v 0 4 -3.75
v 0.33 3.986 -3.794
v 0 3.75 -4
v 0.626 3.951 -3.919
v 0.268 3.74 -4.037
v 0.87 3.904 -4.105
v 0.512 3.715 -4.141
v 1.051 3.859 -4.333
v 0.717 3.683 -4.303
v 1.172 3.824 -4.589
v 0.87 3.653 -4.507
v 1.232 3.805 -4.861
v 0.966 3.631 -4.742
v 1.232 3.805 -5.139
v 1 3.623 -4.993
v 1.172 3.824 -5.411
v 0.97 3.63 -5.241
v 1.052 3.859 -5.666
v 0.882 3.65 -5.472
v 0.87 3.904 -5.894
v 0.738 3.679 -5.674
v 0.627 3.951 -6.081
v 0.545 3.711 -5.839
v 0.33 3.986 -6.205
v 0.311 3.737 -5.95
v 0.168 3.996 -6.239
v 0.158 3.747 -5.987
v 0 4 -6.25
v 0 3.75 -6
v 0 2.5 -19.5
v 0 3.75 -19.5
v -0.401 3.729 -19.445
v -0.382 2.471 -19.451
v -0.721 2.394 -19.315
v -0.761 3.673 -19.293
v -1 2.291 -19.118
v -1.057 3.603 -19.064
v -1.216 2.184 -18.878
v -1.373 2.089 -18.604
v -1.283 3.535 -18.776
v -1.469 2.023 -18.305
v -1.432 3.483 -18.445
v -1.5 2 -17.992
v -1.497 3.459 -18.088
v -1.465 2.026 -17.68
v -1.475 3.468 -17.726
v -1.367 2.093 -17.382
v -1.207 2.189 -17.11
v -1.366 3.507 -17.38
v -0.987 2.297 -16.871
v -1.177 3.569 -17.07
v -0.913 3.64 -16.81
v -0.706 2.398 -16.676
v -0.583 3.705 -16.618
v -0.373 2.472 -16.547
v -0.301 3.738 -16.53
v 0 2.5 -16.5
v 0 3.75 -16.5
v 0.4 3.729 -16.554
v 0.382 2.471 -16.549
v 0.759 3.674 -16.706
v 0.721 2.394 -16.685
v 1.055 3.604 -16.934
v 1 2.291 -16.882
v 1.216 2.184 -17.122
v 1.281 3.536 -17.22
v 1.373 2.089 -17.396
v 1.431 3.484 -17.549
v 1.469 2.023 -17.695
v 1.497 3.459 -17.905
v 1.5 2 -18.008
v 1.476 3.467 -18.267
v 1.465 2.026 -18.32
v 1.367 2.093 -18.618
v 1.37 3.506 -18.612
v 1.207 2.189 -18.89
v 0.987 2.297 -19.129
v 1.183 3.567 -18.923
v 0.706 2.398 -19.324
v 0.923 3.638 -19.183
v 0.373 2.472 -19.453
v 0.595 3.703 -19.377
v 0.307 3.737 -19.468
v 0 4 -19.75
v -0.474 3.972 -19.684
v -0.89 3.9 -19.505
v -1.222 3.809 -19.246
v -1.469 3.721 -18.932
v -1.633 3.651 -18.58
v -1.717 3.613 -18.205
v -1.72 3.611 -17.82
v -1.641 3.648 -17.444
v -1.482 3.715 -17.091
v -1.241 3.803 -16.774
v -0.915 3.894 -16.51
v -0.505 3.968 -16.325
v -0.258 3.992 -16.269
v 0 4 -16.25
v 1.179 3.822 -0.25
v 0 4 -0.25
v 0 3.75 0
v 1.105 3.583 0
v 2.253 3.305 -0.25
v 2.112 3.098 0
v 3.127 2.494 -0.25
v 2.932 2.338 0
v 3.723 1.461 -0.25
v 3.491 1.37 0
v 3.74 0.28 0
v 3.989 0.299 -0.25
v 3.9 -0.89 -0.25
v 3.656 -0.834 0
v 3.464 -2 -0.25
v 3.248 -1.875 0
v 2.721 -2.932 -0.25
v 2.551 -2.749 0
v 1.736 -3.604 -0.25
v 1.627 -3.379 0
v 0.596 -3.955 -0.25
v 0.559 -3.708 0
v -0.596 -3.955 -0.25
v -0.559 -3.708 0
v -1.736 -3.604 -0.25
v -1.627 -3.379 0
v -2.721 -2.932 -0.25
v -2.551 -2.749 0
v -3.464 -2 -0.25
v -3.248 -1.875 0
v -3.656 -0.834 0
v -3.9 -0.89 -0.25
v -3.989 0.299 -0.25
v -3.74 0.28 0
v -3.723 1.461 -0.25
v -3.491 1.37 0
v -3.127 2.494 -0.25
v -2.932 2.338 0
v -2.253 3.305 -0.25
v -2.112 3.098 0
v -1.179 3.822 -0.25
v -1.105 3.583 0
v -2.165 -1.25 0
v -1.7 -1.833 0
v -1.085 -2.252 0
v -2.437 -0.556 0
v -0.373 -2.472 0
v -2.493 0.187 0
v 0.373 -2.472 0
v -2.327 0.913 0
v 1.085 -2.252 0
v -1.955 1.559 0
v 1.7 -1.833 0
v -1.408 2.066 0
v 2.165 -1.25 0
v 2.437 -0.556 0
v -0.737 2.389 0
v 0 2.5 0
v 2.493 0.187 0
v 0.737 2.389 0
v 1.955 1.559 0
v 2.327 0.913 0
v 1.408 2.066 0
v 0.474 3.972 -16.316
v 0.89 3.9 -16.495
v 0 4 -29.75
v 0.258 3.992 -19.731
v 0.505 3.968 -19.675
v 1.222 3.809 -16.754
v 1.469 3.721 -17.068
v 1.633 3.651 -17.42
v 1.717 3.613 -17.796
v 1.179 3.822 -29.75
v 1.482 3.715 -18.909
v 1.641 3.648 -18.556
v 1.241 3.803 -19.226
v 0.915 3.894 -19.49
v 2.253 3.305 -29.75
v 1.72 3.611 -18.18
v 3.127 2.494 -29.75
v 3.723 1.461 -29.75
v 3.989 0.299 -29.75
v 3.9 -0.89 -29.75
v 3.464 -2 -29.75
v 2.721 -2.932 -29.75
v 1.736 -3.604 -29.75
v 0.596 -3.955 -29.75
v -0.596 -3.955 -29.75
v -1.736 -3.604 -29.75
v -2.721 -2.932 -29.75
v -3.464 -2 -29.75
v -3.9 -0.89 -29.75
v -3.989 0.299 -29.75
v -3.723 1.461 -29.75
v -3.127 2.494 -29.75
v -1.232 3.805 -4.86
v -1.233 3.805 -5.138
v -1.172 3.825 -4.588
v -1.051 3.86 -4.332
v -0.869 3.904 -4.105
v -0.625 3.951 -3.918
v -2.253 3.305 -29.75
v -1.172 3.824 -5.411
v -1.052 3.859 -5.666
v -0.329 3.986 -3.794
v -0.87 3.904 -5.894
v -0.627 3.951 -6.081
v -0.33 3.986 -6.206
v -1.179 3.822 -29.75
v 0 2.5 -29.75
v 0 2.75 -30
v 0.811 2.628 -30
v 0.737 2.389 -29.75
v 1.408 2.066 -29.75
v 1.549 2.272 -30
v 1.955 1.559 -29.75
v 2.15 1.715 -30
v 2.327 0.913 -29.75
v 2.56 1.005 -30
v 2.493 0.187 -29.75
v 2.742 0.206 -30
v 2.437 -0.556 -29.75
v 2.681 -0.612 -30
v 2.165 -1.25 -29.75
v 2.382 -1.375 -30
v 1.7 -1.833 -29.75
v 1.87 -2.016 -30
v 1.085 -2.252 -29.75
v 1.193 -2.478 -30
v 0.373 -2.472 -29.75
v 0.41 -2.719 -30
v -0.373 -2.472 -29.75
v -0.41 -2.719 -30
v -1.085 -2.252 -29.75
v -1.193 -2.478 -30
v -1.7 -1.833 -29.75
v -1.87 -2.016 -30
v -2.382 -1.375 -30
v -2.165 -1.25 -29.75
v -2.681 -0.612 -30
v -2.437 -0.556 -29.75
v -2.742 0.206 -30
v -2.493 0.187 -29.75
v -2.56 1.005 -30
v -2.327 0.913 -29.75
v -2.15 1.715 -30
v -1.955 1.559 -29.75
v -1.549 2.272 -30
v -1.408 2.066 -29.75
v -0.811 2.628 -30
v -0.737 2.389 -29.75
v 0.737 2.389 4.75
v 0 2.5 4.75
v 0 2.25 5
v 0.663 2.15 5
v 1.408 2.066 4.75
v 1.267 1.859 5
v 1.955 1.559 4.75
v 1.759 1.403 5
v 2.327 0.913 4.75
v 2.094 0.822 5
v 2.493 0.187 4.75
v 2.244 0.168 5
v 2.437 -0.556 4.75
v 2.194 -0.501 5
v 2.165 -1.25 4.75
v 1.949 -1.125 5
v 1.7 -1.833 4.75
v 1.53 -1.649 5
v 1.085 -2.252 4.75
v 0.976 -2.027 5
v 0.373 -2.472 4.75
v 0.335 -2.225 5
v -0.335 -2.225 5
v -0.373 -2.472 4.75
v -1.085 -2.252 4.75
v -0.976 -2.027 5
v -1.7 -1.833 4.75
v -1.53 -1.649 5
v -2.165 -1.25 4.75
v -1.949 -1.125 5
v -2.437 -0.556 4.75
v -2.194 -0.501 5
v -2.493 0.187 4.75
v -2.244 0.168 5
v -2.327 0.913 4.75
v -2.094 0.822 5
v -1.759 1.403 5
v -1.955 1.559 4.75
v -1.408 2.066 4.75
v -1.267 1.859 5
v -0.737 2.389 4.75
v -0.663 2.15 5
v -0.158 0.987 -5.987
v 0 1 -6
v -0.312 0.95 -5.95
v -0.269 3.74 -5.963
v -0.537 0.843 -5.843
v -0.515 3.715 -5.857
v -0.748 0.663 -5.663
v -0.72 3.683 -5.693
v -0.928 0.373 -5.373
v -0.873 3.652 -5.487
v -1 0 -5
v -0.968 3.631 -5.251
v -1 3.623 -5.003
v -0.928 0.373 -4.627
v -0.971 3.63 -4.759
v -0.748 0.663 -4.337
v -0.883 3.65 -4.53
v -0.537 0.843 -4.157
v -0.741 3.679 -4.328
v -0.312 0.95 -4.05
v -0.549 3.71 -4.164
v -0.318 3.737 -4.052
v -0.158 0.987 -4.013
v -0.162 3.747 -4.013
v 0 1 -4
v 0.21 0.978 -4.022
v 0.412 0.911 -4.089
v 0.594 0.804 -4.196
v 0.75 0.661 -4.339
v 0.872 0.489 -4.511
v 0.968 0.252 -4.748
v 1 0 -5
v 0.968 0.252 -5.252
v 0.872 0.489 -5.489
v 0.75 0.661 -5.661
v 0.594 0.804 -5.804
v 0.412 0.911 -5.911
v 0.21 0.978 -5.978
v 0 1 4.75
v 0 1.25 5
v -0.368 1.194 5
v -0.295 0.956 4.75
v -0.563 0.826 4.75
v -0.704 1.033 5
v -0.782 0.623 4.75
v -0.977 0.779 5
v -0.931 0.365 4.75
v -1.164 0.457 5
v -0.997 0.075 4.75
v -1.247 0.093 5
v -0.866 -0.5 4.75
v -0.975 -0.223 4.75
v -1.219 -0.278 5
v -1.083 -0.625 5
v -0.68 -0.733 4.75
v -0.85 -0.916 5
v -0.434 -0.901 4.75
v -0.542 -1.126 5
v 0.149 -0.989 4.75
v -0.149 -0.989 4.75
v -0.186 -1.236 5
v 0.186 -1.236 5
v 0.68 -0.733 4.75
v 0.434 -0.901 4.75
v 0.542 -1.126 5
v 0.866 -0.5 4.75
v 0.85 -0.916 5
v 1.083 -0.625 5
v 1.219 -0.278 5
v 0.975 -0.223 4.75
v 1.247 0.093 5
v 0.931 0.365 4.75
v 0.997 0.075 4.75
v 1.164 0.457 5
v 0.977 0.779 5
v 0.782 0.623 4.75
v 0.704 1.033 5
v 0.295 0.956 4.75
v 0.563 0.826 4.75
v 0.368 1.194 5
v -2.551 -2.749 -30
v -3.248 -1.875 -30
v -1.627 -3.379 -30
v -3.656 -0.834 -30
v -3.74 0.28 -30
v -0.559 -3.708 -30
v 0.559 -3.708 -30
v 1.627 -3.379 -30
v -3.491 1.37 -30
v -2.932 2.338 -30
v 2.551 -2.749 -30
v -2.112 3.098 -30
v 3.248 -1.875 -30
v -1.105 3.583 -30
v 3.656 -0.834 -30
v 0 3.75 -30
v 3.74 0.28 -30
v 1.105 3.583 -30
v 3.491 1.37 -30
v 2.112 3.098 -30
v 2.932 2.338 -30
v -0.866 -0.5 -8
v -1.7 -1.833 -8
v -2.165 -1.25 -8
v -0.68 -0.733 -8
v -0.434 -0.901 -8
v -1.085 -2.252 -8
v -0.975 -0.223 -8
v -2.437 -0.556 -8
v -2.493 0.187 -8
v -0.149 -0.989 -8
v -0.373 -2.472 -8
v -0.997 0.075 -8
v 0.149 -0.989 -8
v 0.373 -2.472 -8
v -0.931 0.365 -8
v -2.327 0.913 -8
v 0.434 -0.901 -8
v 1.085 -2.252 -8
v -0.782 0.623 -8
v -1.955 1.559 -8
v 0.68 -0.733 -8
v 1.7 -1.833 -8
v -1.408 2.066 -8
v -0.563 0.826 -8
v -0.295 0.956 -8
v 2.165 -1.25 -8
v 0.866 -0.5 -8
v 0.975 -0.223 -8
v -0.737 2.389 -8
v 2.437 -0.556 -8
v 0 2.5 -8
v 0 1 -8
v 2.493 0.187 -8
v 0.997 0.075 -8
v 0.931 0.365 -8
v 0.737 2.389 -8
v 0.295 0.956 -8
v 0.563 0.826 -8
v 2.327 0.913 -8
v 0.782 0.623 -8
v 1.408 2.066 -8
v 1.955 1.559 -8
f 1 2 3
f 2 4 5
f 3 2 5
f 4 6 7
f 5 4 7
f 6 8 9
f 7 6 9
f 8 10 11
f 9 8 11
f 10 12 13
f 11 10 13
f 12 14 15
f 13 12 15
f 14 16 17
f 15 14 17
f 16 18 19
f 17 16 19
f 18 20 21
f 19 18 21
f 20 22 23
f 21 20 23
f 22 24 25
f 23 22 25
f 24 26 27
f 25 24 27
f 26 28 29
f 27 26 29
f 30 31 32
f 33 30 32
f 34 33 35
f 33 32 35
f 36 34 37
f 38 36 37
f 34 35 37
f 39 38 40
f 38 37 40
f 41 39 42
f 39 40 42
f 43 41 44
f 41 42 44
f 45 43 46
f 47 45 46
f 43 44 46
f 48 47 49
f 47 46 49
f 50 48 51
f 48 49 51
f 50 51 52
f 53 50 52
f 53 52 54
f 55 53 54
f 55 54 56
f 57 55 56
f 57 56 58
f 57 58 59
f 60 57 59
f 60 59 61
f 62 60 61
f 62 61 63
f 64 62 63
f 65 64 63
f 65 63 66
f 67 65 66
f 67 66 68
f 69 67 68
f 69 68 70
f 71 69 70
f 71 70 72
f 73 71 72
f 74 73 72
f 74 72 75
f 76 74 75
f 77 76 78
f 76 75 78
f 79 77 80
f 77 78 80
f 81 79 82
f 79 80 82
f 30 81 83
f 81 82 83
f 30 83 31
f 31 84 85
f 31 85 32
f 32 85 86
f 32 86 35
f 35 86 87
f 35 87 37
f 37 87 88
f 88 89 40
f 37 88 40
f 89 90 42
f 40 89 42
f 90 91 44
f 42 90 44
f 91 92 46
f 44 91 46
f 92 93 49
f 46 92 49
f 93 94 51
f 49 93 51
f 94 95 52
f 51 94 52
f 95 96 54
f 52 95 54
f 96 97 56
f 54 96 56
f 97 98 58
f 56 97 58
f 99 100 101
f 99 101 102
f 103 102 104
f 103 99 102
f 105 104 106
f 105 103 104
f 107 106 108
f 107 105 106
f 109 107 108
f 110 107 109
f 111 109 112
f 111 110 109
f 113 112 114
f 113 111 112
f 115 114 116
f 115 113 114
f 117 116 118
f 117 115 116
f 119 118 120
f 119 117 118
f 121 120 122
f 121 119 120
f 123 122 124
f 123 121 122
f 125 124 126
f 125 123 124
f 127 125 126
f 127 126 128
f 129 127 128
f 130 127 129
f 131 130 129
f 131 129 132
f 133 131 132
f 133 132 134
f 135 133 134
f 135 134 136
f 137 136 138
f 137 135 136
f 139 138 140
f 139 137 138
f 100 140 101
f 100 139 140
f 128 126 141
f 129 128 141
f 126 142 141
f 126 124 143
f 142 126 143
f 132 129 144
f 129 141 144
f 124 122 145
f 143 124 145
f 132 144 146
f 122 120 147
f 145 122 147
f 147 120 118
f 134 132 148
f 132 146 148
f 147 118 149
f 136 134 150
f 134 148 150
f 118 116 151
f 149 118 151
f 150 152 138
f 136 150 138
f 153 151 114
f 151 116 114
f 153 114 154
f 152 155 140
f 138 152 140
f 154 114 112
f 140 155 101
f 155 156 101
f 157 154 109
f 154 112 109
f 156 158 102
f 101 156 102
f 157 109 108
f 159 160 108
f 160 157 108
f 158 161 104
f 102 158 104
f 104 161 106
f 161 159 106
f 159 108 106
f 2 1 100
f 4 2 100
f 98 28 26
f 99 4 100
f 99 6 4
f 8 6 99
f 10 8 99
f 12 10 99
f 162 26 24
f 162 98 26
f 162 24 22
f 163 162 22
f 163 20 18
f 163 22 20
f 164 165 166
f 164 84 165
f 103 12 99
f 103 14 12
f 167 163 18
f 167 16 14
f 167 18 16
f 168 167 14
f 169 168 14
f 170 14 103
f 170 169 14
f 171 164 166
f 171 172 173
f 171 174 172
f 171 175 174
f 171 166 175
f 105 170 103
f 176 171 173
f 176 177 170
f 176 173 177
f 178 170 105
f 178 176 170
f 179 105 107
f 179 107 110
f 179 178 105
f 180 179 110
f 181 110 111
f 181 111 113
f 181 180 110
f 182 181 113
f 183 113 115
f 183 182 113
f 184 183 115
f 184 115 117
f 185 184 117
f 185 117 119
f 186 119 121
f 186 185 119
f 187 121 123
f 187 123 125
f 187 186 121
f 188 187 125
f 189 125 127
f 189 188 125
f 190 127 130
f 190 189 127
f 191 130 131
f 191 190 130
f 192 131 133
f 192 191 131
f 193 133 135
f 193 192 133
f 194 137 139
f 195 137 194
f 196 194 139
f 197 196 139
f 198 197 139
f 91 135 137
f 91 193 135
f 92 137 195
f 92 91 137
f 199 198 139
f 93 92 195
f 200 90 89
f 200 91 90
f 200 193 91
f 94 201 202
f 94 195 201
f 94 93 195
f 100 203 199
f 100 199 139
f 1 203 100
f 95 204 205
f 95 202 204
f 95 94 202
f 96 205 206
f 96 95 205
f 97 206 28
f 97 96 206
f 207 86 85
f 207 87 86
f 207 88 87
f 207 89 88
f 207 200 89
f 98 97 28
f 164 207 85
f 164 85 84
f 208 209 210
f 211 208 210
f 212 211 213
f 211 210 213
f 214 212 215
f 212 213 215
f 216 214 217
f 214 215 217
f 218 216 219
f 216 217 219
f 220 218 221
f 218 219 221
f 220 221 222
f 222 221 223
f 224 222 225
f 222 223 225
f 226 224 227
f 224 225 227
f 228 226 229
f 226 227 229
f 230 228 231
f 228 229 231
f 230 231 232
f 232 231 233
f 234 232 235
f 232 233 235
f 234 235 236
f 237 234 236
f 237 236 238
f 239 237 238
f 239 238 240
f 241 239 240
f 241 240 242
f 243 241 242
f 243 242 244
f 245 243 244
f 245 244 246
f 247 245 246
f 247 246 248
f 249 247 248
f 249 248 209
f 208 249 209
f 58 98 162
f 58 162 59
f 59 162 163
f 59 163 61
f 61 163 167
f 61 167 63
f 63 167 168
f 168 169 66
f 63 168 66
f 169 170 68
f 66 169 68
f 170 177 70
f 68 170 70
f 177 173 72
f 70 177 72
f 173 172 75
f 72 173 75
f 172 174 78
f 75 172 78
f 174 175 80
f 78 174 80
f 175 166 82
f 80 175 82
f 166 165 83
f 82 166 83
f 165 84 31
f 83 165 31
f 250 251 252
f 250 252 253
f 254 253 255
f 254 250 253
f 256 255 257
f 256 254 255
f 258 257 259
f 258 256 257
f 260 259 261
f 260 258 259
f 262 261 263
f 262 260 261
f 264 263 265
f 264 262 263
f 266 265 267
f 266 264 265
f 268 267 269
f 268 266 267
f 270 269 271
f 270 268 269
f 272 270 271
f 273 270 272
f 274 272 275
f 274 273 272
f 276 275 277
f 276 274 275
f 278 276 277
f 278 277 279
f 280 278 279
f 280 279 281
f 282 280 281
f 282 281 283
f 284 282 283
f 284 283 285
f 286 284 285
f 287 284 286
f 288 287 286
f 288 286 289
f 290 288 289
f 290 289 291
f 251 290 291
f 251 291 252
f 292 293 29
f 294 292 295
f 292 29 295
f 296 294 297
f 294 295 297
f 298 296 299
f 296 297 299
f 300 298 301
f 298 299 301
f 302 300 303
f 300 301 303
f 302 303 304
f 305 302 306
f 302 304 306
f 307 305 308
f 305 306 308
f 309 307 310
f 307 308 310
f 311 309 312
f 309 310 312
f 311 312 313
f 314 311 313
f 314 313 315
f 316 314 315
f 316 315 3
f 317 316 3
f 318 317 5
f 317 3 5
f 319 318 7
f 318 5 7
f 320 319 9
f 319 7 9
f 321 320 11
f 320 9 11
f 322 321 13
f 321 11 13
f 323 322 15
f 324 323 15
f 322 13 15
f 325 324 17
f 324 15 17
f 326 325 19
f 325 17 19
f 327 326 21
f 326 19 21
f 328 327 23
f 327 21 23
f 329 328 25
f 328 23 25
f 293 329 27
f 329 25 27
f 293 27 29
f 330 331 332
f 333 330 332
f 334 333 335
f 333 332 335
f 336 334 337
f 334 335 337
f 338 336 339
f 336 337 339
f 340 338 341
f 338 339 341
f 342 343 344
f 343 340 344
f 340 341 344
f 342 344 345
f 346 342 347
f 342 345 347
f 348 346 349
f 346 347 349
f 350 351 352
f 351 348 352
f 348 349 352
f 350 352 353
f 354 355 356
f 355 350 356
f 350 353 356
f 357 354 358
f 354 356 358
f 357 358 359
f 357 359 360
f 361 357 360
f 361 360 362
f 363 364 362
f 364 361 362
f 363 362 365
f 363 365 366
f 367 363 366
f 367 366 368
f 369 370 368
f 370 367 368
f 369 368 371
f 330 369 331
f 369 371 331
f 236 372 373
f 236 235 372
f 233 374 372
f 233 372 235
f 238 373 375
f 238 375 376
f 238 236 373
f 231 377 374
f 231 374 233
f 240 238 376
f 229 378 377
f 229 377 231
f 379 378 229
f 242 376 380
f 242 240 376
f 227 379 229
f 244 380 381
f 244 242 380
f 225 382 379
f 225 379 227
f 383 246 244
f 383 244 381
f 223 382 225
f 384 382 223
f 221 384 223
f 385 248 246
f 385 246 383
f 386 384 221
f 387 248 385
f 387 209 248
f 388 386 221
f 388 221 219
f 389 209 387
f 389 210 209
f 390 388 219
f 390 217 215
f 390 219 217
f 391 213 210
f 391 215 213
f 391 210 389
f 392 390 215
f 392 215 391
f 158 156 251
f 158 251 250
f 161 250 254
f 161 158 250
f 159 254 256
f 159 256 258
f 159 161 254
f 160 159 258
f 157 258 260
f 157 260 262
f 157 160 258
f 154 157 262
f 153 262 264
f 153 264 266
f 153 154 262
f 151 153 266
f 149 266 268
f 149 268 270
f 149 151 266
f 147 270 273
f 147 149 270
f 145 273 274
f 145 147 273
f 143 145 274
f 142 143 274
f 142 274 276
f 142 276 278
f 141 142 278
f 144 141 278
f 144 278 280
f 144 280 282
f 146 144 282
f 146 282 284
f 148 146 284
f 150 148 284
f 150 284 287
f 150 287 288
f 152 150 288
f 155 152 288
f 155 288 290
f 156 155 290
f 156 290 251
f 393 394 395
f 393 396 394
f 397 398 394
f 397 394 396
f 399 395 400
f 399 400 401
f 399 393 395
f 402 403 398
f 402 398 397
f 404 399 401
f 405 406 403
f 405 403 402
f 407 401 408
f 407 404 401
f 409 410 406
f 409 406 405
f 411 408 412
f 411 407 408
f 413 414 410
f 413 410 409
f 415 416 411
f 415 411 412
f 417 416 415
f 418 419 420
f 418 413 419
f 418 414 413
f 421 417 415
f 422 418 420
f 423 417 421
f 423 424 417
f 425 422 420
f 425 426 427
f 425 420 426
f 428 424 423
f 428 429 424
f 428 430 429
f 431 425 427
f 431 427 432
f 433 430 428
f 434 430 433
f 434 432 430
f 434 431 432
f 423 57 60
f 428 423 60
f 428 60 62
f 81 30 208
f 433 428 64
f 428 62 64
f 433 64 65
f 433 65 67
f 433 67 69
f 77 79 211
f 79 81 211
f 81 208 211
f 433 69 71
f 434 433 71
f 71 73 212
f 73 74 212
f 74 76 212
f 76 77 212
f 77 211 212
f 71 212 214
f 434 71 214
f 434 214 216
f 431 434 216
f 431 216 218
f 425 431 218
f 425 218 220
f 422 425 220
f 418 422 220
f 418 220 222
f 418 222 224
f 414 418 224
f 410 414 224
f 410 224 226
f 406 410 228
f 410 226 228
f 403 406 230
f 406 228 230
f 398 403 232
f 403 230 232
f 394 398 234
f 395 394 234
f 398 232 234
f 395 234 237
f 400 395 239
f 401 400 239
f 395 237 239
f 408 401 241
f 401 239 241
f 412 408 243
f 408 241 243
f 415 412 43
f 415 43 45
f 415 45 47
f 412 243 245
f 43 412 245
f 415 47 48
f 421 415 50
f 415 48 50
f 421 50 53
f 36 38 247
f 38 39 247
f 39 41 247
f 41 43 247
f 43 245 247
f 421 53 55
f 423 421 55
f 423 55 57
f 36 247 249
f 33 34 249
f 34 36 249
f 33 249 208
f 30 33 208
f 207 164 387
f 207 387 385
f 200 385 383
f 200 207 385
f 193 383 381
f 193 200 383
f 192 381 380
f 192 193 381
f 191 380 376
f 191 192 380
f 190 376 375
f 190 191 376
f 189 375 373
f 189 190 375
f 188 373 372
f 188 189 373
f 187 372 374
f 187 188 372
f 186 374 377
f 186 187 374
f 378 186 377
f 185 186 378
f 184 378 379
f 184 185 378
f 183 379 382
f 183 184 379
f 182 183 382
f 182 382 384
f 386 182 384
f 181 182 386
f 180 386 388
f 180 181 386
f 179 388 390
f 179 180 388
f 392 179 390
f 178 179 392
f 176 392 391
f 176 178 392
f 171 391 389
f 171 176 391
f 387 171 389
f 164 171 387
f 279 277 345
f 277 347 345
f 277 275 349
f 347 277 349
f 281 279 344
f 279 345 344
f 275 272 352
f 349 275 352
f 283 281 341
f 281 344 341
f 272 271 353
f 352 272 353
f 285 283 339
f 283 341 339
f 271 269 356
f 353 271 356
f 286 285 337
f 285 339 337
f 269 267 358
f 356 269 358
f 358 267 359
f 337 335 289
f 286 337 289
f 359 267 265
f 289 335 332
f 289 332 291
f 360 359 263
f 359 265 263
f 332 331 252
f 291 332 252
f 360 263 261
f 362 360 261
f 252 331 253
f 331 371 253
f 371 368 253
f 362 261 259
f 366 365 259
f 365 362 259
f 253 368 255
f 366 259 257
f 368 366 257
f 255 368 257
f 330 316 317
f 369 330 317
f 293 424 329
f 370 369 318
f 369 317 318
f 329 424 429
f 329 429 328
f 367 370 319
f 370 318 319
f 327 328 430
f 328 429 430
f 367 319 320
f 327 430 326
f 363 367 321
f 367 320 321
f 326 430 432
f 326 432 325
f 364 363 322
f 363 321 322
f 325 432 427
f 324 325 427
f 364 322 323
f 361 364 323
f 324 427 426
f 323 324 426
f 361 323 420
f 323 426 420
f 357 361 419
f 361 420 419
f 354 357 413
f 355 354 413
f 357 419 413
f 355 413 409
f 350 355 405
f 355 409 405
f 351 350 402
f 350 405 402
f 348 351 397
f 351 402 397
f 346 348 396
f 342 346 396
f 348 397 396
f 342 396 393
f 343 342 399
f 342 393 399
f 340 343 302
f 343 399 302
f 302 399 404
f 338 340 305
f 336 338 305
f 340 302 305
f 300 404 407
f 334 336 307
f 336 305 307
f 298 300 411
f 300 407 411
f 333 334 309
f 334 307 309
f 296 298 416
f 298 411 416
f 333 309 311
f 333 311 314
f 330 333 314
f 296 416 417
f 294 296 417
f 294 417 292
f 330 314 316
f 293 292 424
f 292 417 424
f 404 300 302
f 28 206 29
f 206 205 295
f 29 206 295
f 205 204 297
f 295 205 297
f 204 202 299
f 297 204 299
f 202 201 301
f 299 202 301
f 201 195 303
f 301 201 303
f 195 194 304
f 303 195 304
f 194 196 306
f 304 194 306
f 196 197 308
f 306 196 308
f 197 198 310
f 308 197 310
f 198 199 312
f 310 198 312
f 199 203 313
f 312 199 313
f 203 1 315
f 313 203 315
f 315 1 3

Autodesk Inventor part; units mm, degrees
ref_plane "YZ Plane" through (0, 0, 0) normal (1, 0, 0) x (0, 1, 0)
ref_plane "XZ Plane" through (0, 0, 0) normal (0, 1, 0) x (-1, 0, 0)
ref_plane "XY Plane" through (0, 0, 0) normal (0, 0, 1) x (1, 0, 0)
sketch "Skizze1" plane through (0, 0, 0) normal (1, 0, 0) x (0, 1, 0)
  line L0 (0, 20) -> (0, -20)
  line L1 (0, 5) -> (2.5, 5)
  line L2 (2.5, 5) -> (2.5, 0)
  line L3 (2.5, 0) -> (0, 0) construction
  line L4 (2.5, 0) -> (4, 0)
  line L5 (4, 0) -> (4, -30)
  line L6 (4, -30) -> (0, -30)
  line L7 (2.5, -8) -> (2.5, -30)
  line L8 (1, 5) -> (1, -8)
  line L9 (1, -8) -> (2.5, -8)
  dimension "d0" = 40
  dimension "d1" = 5
  dimension "d2" = 5
  dimension "d4" = 8
  dimension "d5" = 30
  dimension "d8" = 22
  dimension "d9" = 5
  dimension "d10" = 2
revolve "Umdrehung1" add sketch "Skizze1" angle 360 about axis through (0, 0, 20) along (0, 0, -1)
sketch "Skizze2" plane through (0, 0, 0) normal (0, 1, 0) x (-1, 0, 0)
  line L0 (-4, -30) -> (4, -30) projected
  line L1 (-4, 0) -> (4, 0) projected
  point P0 (0, 0)
  point P1 (0, -5)
  point P2 (0, -18)
  dimension "d12" = 12
  dimension "d13" = 5
hole "Bohrung1" at (0, 0, -5) direction (0, 1, 0) diameter 2 end through all
hole "Bohrung2" at (0, 0, -18) direction (0, 1, 0) diameter 3 end through all
thread "Gewinde1" size "M3x0.5" class "6H" standard "ISO Metric profile" full length
thread "Gewinde2" size "M2x0.4" class "6H" standard "ISO Metric profile" full length
chamfer "Fase1" distance 0.25 angle 45 2 edges at (1.5, 3.7081, -18.0006) (-1.5, 3.7081, -17.9994)
chamfer "Fase2" distance 0.25 angle 45 2 edges at (1, 3.873, -4.9999) (-1, 3.873, -5.0001)
chamfer "Fase3" distance 0.25 angle 45 1 edges at (0, -1, 5)
chamfer "Fase4" distance 0.25 angle 45 1 edges at (0, -2.5, -30)
chamfer "Fase5" distance 0.25 angle 45 1 edges at (0, -2.5, 5)
chamfer "Fase6" distance 0.25 angle 45 1 edges at (0, -4, 0)
chamfer "Fase7" distance 0.25 angle 45 1 edges at (0, -4, -30)
properties part number "BT802_goteln20_21_Zeichenmaschine_Welle_2zu5"
